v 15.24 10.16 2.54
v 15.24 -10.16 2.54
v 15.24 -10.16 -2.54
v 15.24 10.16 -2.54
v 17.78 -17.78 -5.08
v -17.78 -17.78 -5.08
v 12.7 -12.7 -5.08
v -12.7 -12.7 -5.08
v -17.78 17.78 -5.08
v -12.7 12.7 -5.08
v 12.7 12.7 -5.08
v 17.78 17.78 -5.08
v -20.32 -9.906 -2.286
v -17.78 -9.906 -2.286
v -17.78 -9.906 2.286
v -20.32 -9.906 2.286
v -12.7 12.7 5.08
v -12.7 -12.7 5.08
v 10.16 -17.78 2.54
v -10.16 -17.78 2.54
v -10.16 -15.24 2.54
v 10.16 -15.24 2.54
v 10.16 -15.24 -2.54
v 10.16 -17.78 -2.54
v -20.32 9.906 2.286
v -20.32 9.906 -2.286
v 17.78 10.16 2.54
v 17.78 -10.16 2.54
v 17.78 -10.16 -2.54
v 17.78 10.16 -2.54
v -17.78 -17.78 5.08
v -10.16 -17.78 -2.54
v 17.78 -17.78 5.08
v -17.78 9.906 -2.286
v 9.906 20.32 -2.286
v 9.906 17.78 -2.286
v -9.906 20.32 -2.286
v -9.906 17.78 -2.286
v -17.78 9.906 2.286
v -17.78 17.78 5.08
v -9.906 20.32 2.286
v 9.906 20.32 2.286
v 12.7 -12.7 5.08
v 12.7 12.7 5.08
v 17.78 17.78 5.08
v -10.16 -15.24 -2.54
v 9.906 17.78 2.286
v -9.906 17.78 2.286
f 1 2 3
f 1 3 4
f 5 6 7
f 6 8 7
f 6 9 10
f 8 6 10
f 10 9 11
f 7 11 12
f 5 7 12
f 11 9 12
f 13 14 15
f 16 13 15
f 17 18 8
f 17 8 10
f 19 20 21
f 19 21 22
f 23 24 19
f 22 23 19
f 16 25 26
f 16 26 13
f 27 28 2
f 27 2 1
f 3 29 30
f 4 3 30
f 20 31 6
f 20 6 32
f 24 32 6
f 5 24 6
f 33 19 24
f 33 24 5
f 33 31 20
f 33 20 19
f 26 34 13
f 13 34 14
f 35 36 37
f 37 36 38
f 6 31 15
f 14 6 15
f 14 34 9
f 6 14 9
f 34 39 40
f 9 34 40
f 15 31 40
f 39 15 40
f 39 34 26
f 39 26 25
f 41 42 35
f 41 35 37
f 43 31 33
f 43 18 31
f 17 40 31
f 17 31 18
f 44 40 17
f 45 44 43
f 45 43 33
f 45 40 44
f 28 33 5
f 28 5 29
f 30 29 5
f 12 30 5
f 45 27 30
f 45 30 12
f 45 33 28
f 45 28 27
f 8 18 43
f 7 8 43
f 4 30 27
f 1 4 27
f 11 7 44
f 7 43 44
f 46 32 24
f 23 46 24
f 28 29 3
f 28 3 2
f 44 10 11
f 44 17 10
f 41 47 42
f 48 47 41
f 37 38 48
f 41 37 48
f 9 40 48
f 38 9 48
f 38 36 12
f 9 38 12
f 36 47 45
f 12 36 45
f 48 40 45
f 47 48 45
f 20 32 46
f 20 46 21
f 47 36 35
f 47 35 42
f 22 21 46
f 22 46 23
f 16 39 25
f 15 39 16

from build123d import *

# Parameters (mm, degrees)
F0_W     = 35.56
F0_H     = 35.56
F0_W_2   = 25.4
F0_H_2   = 25.4
F1_DEPTH = 5.08
F2_W     = 19.812
F2_H     = 4.572
F3_DEPTH = 2.54
F4_W     = 19.812
F4_H     = 4.572
F5_DEPTH = 2.54
F6_W     = 20.32
F6_H     = 5.08
F7_DEPTH = 2.54
F8_W     = 20.32
F8_H     = 5.08
F9_DEPTH = 2.54


with BuildPart() as f1:
    # F0 (on Top) → F1 (new body, symmetric)
    with BuildSketch(Plane.XY):
        Rectangle(F0_W, F0_H)
        Rectangle(F0_W_2, F0_H_2, mode=Mode.SUBTRACT)
    extrude(amount=F1_DEPTH, both=True)

    # F2 (on face) → F3 (join)
    with BuildSketch(Plane(origin=(-17.78, 0, 0), x_dir=(0, -1, 0), z_dir=(-1, 0, 0))):
        Rectangle(F2_W, F2_H)
    extrude(amount=F3_DEPTH)

    # F4 (on face) → F5 (join)
    with BuildSketch(Plane(origin=(0, 17.78, 0), x_dir=(-1, 0, 0), z_dir=(0, 1, 0))):
        Rectangle(F4_W, F4_H)
    extrude(amount=F5_DEPTH)

    # F6 (on face) → F7 (cut)
    with BuildSketch(Plane.YZ.offset(17.78)):
        Rectangle(F6_W, F6_H)
    extrude(amount=-F7_DEPTH, mode=Mode.SUBTRACT)

    # F8 (on face) → F9 (cut)
    with BuildSketch(Plane.XZ.offset(17.78)):
        Rectangle(F8_W, F8_H)
    extrude(amount=-F9_DEPTH, mode=Mode.SUBTRACT)


solid = f1.part
